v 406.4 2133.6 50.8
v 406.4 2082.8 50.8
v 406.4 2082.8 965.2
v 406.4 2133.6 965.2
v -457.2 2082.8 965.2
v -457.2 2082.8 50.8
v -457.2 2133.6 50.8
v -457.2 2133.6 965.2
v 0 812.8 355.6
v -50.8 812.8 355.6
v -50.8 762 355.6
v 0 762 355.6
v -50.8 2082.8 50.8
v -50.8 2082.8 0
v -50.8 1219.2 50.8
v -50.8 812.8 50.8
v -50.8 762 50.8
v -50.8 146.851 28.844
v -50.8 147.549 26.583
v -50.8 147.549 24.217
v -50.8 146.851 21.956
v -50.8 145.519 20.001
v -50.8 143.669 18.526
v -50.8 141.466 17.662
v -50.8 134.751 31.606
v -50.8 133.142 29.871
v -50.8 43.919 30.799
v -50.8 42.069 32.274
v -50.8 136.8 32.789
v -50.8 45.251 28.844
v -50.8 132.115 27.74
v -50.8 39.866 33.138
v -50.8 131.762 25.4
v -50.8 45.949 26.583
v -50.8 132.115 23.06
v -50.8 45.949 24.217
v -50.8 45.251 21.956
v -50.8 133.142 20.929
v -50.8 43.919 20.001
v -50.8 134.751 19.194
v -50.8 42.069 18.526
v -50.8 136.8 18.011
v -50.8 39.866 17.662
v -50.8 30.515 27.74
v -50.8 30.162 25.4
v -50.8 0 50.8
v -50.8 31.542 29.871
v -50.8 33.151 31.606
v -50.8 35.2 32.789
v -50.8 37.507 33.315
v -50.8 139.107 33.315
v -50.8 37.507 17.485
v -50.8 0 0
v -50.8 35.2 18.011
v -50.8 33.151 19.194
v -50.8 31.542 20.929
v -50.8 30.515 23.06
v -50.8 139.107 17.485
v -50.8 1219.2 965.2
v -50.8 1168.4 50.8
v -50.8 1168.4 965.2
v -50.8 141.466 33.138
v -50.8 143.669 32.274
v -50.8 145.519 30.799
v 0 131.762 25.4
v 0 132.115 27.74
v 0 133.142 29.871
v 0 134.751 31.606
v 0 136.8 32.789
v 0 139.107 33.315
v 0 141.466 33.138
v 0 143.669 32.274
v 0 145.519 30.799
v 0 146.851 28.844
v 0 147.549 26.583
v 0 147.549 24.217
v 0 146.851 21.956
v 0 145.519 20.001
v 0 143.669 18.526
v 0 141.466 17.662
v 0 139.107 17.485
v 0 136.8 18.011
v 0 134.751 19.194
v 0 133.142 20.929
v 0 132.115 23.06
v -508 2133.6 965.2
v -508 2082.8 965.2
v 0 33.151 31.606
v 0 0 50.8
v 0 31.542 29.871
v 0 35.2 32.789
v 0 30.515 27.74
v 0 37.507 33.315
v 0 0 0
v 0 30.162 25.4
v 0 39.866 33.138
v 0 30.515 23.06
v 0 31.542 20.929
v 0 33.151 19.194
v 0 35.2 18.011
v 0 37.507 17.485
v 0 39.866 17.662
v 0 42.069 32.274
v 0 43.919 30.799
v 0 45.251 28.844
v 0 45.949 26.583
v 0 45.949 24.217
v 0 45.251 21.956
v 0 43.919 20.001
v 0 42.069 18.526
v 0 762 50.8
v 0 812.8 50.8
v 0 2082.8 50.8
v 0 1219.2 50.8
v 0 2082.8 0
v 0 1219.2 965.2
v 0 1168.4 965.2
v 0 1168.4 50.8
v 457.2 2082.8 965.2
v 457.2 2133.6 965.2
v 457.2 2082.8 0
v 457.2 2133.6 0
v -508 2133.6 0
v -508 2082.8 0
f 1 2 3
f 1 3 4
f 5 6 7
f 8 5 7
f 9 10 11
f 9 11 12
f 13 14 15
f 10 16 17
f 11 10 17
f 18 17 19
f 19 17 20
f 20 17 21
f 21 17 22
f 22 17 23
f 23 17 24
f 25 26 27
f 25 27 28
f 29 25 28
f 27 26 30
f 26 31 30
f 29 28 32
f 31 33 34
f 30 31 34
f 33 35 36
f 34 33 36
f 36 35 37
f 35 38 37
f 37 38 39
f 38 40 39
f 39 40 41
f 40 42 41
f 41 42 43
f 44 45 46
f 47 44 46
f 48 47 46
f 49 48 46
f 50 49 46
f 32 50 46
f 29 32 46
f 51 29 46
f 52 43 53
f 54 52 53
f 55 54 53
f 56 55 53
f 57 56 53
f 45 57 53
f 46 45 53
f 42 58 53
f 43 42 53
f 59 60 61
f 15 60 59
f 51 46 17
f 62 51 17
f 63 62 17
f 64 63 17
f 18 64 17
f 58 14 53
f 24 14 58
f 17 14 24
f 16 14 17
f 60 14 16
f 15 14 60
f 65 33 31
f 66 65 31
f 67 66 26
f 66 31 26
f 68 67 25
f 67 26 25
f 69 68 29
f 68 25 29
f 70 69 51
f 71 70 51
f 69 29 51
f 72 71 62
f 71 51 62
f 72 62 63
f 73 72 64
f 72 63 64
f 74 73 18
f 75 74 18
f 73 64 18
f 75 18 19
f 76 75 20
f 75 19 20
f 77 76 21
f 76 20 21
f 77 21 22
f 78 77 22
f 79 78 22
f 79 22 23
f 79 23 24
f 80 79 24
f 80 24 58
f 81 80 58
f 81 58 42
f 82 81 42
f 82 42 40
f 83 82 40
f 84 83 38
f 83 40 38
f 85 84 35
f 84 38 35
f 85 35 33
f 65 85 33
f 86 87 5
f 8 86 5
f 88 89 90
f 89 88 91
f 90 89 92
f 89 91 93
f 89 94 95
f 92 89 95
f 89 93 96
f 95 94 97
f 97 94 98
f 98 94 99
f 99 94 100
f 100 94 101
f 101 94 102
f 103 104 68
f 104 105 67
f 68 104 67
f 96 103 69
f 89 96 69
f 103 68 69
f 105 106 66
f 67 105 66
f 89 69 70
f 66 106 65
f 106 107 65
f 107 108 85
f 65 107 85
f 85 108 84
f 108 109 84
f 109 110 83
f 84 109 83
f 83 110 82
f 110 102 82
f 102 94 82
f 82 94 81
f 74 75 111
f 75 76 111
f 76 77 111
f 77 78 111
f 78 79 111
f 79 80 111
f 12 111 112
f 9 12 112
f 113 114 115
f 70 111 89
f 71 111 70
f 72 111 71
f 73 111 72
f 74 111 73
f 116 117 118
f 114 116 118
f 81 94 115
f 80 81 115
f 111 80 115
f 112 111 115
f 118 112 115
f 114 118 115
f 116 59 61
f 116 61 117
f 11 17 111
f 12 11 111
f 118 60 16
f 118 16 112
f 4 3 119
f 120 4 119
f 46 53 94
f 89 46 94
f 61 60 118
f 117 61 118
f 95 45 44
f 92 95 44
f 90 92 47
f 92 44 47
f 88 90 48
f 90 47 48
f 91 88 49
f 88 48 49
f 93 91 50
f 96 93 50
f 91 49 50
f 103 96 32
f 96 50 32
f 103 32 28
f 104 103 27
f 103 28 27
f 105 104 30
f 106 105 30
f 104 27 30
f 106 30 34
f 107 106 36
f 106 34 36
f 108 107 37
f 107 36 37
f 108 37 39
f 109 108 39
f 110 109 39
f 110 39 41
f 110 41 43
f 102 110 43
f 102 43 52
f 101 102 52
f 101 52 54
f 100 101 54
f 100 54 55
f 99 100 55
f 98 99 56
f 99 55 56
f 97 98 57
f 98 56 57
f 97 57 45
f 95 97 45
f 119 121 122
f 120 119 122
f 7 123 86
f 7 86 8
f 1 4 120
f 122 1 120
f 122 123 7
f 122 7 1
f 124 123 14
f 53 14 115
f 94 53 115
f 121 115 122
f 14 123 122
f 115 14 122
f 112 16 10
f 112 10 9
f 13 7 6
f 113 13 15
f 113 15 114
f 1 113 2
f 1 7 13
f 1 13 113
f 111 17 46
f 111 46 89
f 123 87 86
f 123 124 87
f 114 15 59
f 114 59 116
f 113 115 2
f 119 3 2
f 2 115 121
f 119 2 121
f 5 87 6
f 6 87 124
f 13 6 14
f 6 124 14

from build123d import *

# Parameters (mm, degrees)
F0_W     = 457.2
F0_H     = 50.8
F1_DEPTH = 50.8
F2_W     = 50.8
F2_H     = 50.8
F3_DEPTH = 914.4
F4_W     = 50.8
F4_H     = 50.8
F5_DEPTH = 914.4
F6_W     = 50.8
F6_H     = 50.8
F7_DEPTH = 304.8
F8_R     = 7.9375
F9_DEPTH = 50.8


with BuildPart() as f1:
    # F0 (on Top) → F1 (new body)
    with BuildSketch(Plane.XY):
        Polygon((0, 2082.8), (0, 2133.6), (-50.8, 2133.6), (-50.8, 2082.8), (-50.8, 0), (0, 0), align=None)
        with Locations((228.6, 2108.2)):
            Rectangle(F0_W, F0_H)
        with Locations((-279.4, 2108.2)):
            Rectangle(F0_W, F0_H)
    extrude(amount=F1_DEPTH)

    # F2 (on face) → F3 (join)
    with BuildSketch(Plane.XY.offset(50.8)):
        with Locations((-482.6, 2108.2)):
            Rectangle(F2_W, F2_H)
        with Locations((431.8, 2108.2)):
            Rectangle(F2_W, F2_H)
    extrude(amount=F3_DEPTH)

    # F4 (on face) → F5 (join)
    with BuildSketch(Plane.XY.offset(50.8)):
        with Locations((-25.4, 1193.8)):
            Rectangle(F4_W, F4_H)
    extrude(amount=F5_DEPTH)

    # F6 (on face) → F7 (join)
    with BuildSketch(Plane.XY.offset(50.8)):
        with Locations((-25.4, 787.4)):
            Rectangle(F6_W, F6_H)
    extrude(amount=F7_DEPTH)

    # F8 (on face) → F9 (cut)
    with BuildSketch(Plane(origin=(-50.8, 0, 0), x_dir=(0, -1, 0), z_dir=(-1, 0, 0))):
        with Locations((-139.7, 25.4)):
            Circle(F8_R)
        with Locations((-38.1, 25.4)):
            Circle(F8_R)
    extrude(amount=-F9_DEPTH, mode=Mode.SUBTRACT)


solid = f1.part
